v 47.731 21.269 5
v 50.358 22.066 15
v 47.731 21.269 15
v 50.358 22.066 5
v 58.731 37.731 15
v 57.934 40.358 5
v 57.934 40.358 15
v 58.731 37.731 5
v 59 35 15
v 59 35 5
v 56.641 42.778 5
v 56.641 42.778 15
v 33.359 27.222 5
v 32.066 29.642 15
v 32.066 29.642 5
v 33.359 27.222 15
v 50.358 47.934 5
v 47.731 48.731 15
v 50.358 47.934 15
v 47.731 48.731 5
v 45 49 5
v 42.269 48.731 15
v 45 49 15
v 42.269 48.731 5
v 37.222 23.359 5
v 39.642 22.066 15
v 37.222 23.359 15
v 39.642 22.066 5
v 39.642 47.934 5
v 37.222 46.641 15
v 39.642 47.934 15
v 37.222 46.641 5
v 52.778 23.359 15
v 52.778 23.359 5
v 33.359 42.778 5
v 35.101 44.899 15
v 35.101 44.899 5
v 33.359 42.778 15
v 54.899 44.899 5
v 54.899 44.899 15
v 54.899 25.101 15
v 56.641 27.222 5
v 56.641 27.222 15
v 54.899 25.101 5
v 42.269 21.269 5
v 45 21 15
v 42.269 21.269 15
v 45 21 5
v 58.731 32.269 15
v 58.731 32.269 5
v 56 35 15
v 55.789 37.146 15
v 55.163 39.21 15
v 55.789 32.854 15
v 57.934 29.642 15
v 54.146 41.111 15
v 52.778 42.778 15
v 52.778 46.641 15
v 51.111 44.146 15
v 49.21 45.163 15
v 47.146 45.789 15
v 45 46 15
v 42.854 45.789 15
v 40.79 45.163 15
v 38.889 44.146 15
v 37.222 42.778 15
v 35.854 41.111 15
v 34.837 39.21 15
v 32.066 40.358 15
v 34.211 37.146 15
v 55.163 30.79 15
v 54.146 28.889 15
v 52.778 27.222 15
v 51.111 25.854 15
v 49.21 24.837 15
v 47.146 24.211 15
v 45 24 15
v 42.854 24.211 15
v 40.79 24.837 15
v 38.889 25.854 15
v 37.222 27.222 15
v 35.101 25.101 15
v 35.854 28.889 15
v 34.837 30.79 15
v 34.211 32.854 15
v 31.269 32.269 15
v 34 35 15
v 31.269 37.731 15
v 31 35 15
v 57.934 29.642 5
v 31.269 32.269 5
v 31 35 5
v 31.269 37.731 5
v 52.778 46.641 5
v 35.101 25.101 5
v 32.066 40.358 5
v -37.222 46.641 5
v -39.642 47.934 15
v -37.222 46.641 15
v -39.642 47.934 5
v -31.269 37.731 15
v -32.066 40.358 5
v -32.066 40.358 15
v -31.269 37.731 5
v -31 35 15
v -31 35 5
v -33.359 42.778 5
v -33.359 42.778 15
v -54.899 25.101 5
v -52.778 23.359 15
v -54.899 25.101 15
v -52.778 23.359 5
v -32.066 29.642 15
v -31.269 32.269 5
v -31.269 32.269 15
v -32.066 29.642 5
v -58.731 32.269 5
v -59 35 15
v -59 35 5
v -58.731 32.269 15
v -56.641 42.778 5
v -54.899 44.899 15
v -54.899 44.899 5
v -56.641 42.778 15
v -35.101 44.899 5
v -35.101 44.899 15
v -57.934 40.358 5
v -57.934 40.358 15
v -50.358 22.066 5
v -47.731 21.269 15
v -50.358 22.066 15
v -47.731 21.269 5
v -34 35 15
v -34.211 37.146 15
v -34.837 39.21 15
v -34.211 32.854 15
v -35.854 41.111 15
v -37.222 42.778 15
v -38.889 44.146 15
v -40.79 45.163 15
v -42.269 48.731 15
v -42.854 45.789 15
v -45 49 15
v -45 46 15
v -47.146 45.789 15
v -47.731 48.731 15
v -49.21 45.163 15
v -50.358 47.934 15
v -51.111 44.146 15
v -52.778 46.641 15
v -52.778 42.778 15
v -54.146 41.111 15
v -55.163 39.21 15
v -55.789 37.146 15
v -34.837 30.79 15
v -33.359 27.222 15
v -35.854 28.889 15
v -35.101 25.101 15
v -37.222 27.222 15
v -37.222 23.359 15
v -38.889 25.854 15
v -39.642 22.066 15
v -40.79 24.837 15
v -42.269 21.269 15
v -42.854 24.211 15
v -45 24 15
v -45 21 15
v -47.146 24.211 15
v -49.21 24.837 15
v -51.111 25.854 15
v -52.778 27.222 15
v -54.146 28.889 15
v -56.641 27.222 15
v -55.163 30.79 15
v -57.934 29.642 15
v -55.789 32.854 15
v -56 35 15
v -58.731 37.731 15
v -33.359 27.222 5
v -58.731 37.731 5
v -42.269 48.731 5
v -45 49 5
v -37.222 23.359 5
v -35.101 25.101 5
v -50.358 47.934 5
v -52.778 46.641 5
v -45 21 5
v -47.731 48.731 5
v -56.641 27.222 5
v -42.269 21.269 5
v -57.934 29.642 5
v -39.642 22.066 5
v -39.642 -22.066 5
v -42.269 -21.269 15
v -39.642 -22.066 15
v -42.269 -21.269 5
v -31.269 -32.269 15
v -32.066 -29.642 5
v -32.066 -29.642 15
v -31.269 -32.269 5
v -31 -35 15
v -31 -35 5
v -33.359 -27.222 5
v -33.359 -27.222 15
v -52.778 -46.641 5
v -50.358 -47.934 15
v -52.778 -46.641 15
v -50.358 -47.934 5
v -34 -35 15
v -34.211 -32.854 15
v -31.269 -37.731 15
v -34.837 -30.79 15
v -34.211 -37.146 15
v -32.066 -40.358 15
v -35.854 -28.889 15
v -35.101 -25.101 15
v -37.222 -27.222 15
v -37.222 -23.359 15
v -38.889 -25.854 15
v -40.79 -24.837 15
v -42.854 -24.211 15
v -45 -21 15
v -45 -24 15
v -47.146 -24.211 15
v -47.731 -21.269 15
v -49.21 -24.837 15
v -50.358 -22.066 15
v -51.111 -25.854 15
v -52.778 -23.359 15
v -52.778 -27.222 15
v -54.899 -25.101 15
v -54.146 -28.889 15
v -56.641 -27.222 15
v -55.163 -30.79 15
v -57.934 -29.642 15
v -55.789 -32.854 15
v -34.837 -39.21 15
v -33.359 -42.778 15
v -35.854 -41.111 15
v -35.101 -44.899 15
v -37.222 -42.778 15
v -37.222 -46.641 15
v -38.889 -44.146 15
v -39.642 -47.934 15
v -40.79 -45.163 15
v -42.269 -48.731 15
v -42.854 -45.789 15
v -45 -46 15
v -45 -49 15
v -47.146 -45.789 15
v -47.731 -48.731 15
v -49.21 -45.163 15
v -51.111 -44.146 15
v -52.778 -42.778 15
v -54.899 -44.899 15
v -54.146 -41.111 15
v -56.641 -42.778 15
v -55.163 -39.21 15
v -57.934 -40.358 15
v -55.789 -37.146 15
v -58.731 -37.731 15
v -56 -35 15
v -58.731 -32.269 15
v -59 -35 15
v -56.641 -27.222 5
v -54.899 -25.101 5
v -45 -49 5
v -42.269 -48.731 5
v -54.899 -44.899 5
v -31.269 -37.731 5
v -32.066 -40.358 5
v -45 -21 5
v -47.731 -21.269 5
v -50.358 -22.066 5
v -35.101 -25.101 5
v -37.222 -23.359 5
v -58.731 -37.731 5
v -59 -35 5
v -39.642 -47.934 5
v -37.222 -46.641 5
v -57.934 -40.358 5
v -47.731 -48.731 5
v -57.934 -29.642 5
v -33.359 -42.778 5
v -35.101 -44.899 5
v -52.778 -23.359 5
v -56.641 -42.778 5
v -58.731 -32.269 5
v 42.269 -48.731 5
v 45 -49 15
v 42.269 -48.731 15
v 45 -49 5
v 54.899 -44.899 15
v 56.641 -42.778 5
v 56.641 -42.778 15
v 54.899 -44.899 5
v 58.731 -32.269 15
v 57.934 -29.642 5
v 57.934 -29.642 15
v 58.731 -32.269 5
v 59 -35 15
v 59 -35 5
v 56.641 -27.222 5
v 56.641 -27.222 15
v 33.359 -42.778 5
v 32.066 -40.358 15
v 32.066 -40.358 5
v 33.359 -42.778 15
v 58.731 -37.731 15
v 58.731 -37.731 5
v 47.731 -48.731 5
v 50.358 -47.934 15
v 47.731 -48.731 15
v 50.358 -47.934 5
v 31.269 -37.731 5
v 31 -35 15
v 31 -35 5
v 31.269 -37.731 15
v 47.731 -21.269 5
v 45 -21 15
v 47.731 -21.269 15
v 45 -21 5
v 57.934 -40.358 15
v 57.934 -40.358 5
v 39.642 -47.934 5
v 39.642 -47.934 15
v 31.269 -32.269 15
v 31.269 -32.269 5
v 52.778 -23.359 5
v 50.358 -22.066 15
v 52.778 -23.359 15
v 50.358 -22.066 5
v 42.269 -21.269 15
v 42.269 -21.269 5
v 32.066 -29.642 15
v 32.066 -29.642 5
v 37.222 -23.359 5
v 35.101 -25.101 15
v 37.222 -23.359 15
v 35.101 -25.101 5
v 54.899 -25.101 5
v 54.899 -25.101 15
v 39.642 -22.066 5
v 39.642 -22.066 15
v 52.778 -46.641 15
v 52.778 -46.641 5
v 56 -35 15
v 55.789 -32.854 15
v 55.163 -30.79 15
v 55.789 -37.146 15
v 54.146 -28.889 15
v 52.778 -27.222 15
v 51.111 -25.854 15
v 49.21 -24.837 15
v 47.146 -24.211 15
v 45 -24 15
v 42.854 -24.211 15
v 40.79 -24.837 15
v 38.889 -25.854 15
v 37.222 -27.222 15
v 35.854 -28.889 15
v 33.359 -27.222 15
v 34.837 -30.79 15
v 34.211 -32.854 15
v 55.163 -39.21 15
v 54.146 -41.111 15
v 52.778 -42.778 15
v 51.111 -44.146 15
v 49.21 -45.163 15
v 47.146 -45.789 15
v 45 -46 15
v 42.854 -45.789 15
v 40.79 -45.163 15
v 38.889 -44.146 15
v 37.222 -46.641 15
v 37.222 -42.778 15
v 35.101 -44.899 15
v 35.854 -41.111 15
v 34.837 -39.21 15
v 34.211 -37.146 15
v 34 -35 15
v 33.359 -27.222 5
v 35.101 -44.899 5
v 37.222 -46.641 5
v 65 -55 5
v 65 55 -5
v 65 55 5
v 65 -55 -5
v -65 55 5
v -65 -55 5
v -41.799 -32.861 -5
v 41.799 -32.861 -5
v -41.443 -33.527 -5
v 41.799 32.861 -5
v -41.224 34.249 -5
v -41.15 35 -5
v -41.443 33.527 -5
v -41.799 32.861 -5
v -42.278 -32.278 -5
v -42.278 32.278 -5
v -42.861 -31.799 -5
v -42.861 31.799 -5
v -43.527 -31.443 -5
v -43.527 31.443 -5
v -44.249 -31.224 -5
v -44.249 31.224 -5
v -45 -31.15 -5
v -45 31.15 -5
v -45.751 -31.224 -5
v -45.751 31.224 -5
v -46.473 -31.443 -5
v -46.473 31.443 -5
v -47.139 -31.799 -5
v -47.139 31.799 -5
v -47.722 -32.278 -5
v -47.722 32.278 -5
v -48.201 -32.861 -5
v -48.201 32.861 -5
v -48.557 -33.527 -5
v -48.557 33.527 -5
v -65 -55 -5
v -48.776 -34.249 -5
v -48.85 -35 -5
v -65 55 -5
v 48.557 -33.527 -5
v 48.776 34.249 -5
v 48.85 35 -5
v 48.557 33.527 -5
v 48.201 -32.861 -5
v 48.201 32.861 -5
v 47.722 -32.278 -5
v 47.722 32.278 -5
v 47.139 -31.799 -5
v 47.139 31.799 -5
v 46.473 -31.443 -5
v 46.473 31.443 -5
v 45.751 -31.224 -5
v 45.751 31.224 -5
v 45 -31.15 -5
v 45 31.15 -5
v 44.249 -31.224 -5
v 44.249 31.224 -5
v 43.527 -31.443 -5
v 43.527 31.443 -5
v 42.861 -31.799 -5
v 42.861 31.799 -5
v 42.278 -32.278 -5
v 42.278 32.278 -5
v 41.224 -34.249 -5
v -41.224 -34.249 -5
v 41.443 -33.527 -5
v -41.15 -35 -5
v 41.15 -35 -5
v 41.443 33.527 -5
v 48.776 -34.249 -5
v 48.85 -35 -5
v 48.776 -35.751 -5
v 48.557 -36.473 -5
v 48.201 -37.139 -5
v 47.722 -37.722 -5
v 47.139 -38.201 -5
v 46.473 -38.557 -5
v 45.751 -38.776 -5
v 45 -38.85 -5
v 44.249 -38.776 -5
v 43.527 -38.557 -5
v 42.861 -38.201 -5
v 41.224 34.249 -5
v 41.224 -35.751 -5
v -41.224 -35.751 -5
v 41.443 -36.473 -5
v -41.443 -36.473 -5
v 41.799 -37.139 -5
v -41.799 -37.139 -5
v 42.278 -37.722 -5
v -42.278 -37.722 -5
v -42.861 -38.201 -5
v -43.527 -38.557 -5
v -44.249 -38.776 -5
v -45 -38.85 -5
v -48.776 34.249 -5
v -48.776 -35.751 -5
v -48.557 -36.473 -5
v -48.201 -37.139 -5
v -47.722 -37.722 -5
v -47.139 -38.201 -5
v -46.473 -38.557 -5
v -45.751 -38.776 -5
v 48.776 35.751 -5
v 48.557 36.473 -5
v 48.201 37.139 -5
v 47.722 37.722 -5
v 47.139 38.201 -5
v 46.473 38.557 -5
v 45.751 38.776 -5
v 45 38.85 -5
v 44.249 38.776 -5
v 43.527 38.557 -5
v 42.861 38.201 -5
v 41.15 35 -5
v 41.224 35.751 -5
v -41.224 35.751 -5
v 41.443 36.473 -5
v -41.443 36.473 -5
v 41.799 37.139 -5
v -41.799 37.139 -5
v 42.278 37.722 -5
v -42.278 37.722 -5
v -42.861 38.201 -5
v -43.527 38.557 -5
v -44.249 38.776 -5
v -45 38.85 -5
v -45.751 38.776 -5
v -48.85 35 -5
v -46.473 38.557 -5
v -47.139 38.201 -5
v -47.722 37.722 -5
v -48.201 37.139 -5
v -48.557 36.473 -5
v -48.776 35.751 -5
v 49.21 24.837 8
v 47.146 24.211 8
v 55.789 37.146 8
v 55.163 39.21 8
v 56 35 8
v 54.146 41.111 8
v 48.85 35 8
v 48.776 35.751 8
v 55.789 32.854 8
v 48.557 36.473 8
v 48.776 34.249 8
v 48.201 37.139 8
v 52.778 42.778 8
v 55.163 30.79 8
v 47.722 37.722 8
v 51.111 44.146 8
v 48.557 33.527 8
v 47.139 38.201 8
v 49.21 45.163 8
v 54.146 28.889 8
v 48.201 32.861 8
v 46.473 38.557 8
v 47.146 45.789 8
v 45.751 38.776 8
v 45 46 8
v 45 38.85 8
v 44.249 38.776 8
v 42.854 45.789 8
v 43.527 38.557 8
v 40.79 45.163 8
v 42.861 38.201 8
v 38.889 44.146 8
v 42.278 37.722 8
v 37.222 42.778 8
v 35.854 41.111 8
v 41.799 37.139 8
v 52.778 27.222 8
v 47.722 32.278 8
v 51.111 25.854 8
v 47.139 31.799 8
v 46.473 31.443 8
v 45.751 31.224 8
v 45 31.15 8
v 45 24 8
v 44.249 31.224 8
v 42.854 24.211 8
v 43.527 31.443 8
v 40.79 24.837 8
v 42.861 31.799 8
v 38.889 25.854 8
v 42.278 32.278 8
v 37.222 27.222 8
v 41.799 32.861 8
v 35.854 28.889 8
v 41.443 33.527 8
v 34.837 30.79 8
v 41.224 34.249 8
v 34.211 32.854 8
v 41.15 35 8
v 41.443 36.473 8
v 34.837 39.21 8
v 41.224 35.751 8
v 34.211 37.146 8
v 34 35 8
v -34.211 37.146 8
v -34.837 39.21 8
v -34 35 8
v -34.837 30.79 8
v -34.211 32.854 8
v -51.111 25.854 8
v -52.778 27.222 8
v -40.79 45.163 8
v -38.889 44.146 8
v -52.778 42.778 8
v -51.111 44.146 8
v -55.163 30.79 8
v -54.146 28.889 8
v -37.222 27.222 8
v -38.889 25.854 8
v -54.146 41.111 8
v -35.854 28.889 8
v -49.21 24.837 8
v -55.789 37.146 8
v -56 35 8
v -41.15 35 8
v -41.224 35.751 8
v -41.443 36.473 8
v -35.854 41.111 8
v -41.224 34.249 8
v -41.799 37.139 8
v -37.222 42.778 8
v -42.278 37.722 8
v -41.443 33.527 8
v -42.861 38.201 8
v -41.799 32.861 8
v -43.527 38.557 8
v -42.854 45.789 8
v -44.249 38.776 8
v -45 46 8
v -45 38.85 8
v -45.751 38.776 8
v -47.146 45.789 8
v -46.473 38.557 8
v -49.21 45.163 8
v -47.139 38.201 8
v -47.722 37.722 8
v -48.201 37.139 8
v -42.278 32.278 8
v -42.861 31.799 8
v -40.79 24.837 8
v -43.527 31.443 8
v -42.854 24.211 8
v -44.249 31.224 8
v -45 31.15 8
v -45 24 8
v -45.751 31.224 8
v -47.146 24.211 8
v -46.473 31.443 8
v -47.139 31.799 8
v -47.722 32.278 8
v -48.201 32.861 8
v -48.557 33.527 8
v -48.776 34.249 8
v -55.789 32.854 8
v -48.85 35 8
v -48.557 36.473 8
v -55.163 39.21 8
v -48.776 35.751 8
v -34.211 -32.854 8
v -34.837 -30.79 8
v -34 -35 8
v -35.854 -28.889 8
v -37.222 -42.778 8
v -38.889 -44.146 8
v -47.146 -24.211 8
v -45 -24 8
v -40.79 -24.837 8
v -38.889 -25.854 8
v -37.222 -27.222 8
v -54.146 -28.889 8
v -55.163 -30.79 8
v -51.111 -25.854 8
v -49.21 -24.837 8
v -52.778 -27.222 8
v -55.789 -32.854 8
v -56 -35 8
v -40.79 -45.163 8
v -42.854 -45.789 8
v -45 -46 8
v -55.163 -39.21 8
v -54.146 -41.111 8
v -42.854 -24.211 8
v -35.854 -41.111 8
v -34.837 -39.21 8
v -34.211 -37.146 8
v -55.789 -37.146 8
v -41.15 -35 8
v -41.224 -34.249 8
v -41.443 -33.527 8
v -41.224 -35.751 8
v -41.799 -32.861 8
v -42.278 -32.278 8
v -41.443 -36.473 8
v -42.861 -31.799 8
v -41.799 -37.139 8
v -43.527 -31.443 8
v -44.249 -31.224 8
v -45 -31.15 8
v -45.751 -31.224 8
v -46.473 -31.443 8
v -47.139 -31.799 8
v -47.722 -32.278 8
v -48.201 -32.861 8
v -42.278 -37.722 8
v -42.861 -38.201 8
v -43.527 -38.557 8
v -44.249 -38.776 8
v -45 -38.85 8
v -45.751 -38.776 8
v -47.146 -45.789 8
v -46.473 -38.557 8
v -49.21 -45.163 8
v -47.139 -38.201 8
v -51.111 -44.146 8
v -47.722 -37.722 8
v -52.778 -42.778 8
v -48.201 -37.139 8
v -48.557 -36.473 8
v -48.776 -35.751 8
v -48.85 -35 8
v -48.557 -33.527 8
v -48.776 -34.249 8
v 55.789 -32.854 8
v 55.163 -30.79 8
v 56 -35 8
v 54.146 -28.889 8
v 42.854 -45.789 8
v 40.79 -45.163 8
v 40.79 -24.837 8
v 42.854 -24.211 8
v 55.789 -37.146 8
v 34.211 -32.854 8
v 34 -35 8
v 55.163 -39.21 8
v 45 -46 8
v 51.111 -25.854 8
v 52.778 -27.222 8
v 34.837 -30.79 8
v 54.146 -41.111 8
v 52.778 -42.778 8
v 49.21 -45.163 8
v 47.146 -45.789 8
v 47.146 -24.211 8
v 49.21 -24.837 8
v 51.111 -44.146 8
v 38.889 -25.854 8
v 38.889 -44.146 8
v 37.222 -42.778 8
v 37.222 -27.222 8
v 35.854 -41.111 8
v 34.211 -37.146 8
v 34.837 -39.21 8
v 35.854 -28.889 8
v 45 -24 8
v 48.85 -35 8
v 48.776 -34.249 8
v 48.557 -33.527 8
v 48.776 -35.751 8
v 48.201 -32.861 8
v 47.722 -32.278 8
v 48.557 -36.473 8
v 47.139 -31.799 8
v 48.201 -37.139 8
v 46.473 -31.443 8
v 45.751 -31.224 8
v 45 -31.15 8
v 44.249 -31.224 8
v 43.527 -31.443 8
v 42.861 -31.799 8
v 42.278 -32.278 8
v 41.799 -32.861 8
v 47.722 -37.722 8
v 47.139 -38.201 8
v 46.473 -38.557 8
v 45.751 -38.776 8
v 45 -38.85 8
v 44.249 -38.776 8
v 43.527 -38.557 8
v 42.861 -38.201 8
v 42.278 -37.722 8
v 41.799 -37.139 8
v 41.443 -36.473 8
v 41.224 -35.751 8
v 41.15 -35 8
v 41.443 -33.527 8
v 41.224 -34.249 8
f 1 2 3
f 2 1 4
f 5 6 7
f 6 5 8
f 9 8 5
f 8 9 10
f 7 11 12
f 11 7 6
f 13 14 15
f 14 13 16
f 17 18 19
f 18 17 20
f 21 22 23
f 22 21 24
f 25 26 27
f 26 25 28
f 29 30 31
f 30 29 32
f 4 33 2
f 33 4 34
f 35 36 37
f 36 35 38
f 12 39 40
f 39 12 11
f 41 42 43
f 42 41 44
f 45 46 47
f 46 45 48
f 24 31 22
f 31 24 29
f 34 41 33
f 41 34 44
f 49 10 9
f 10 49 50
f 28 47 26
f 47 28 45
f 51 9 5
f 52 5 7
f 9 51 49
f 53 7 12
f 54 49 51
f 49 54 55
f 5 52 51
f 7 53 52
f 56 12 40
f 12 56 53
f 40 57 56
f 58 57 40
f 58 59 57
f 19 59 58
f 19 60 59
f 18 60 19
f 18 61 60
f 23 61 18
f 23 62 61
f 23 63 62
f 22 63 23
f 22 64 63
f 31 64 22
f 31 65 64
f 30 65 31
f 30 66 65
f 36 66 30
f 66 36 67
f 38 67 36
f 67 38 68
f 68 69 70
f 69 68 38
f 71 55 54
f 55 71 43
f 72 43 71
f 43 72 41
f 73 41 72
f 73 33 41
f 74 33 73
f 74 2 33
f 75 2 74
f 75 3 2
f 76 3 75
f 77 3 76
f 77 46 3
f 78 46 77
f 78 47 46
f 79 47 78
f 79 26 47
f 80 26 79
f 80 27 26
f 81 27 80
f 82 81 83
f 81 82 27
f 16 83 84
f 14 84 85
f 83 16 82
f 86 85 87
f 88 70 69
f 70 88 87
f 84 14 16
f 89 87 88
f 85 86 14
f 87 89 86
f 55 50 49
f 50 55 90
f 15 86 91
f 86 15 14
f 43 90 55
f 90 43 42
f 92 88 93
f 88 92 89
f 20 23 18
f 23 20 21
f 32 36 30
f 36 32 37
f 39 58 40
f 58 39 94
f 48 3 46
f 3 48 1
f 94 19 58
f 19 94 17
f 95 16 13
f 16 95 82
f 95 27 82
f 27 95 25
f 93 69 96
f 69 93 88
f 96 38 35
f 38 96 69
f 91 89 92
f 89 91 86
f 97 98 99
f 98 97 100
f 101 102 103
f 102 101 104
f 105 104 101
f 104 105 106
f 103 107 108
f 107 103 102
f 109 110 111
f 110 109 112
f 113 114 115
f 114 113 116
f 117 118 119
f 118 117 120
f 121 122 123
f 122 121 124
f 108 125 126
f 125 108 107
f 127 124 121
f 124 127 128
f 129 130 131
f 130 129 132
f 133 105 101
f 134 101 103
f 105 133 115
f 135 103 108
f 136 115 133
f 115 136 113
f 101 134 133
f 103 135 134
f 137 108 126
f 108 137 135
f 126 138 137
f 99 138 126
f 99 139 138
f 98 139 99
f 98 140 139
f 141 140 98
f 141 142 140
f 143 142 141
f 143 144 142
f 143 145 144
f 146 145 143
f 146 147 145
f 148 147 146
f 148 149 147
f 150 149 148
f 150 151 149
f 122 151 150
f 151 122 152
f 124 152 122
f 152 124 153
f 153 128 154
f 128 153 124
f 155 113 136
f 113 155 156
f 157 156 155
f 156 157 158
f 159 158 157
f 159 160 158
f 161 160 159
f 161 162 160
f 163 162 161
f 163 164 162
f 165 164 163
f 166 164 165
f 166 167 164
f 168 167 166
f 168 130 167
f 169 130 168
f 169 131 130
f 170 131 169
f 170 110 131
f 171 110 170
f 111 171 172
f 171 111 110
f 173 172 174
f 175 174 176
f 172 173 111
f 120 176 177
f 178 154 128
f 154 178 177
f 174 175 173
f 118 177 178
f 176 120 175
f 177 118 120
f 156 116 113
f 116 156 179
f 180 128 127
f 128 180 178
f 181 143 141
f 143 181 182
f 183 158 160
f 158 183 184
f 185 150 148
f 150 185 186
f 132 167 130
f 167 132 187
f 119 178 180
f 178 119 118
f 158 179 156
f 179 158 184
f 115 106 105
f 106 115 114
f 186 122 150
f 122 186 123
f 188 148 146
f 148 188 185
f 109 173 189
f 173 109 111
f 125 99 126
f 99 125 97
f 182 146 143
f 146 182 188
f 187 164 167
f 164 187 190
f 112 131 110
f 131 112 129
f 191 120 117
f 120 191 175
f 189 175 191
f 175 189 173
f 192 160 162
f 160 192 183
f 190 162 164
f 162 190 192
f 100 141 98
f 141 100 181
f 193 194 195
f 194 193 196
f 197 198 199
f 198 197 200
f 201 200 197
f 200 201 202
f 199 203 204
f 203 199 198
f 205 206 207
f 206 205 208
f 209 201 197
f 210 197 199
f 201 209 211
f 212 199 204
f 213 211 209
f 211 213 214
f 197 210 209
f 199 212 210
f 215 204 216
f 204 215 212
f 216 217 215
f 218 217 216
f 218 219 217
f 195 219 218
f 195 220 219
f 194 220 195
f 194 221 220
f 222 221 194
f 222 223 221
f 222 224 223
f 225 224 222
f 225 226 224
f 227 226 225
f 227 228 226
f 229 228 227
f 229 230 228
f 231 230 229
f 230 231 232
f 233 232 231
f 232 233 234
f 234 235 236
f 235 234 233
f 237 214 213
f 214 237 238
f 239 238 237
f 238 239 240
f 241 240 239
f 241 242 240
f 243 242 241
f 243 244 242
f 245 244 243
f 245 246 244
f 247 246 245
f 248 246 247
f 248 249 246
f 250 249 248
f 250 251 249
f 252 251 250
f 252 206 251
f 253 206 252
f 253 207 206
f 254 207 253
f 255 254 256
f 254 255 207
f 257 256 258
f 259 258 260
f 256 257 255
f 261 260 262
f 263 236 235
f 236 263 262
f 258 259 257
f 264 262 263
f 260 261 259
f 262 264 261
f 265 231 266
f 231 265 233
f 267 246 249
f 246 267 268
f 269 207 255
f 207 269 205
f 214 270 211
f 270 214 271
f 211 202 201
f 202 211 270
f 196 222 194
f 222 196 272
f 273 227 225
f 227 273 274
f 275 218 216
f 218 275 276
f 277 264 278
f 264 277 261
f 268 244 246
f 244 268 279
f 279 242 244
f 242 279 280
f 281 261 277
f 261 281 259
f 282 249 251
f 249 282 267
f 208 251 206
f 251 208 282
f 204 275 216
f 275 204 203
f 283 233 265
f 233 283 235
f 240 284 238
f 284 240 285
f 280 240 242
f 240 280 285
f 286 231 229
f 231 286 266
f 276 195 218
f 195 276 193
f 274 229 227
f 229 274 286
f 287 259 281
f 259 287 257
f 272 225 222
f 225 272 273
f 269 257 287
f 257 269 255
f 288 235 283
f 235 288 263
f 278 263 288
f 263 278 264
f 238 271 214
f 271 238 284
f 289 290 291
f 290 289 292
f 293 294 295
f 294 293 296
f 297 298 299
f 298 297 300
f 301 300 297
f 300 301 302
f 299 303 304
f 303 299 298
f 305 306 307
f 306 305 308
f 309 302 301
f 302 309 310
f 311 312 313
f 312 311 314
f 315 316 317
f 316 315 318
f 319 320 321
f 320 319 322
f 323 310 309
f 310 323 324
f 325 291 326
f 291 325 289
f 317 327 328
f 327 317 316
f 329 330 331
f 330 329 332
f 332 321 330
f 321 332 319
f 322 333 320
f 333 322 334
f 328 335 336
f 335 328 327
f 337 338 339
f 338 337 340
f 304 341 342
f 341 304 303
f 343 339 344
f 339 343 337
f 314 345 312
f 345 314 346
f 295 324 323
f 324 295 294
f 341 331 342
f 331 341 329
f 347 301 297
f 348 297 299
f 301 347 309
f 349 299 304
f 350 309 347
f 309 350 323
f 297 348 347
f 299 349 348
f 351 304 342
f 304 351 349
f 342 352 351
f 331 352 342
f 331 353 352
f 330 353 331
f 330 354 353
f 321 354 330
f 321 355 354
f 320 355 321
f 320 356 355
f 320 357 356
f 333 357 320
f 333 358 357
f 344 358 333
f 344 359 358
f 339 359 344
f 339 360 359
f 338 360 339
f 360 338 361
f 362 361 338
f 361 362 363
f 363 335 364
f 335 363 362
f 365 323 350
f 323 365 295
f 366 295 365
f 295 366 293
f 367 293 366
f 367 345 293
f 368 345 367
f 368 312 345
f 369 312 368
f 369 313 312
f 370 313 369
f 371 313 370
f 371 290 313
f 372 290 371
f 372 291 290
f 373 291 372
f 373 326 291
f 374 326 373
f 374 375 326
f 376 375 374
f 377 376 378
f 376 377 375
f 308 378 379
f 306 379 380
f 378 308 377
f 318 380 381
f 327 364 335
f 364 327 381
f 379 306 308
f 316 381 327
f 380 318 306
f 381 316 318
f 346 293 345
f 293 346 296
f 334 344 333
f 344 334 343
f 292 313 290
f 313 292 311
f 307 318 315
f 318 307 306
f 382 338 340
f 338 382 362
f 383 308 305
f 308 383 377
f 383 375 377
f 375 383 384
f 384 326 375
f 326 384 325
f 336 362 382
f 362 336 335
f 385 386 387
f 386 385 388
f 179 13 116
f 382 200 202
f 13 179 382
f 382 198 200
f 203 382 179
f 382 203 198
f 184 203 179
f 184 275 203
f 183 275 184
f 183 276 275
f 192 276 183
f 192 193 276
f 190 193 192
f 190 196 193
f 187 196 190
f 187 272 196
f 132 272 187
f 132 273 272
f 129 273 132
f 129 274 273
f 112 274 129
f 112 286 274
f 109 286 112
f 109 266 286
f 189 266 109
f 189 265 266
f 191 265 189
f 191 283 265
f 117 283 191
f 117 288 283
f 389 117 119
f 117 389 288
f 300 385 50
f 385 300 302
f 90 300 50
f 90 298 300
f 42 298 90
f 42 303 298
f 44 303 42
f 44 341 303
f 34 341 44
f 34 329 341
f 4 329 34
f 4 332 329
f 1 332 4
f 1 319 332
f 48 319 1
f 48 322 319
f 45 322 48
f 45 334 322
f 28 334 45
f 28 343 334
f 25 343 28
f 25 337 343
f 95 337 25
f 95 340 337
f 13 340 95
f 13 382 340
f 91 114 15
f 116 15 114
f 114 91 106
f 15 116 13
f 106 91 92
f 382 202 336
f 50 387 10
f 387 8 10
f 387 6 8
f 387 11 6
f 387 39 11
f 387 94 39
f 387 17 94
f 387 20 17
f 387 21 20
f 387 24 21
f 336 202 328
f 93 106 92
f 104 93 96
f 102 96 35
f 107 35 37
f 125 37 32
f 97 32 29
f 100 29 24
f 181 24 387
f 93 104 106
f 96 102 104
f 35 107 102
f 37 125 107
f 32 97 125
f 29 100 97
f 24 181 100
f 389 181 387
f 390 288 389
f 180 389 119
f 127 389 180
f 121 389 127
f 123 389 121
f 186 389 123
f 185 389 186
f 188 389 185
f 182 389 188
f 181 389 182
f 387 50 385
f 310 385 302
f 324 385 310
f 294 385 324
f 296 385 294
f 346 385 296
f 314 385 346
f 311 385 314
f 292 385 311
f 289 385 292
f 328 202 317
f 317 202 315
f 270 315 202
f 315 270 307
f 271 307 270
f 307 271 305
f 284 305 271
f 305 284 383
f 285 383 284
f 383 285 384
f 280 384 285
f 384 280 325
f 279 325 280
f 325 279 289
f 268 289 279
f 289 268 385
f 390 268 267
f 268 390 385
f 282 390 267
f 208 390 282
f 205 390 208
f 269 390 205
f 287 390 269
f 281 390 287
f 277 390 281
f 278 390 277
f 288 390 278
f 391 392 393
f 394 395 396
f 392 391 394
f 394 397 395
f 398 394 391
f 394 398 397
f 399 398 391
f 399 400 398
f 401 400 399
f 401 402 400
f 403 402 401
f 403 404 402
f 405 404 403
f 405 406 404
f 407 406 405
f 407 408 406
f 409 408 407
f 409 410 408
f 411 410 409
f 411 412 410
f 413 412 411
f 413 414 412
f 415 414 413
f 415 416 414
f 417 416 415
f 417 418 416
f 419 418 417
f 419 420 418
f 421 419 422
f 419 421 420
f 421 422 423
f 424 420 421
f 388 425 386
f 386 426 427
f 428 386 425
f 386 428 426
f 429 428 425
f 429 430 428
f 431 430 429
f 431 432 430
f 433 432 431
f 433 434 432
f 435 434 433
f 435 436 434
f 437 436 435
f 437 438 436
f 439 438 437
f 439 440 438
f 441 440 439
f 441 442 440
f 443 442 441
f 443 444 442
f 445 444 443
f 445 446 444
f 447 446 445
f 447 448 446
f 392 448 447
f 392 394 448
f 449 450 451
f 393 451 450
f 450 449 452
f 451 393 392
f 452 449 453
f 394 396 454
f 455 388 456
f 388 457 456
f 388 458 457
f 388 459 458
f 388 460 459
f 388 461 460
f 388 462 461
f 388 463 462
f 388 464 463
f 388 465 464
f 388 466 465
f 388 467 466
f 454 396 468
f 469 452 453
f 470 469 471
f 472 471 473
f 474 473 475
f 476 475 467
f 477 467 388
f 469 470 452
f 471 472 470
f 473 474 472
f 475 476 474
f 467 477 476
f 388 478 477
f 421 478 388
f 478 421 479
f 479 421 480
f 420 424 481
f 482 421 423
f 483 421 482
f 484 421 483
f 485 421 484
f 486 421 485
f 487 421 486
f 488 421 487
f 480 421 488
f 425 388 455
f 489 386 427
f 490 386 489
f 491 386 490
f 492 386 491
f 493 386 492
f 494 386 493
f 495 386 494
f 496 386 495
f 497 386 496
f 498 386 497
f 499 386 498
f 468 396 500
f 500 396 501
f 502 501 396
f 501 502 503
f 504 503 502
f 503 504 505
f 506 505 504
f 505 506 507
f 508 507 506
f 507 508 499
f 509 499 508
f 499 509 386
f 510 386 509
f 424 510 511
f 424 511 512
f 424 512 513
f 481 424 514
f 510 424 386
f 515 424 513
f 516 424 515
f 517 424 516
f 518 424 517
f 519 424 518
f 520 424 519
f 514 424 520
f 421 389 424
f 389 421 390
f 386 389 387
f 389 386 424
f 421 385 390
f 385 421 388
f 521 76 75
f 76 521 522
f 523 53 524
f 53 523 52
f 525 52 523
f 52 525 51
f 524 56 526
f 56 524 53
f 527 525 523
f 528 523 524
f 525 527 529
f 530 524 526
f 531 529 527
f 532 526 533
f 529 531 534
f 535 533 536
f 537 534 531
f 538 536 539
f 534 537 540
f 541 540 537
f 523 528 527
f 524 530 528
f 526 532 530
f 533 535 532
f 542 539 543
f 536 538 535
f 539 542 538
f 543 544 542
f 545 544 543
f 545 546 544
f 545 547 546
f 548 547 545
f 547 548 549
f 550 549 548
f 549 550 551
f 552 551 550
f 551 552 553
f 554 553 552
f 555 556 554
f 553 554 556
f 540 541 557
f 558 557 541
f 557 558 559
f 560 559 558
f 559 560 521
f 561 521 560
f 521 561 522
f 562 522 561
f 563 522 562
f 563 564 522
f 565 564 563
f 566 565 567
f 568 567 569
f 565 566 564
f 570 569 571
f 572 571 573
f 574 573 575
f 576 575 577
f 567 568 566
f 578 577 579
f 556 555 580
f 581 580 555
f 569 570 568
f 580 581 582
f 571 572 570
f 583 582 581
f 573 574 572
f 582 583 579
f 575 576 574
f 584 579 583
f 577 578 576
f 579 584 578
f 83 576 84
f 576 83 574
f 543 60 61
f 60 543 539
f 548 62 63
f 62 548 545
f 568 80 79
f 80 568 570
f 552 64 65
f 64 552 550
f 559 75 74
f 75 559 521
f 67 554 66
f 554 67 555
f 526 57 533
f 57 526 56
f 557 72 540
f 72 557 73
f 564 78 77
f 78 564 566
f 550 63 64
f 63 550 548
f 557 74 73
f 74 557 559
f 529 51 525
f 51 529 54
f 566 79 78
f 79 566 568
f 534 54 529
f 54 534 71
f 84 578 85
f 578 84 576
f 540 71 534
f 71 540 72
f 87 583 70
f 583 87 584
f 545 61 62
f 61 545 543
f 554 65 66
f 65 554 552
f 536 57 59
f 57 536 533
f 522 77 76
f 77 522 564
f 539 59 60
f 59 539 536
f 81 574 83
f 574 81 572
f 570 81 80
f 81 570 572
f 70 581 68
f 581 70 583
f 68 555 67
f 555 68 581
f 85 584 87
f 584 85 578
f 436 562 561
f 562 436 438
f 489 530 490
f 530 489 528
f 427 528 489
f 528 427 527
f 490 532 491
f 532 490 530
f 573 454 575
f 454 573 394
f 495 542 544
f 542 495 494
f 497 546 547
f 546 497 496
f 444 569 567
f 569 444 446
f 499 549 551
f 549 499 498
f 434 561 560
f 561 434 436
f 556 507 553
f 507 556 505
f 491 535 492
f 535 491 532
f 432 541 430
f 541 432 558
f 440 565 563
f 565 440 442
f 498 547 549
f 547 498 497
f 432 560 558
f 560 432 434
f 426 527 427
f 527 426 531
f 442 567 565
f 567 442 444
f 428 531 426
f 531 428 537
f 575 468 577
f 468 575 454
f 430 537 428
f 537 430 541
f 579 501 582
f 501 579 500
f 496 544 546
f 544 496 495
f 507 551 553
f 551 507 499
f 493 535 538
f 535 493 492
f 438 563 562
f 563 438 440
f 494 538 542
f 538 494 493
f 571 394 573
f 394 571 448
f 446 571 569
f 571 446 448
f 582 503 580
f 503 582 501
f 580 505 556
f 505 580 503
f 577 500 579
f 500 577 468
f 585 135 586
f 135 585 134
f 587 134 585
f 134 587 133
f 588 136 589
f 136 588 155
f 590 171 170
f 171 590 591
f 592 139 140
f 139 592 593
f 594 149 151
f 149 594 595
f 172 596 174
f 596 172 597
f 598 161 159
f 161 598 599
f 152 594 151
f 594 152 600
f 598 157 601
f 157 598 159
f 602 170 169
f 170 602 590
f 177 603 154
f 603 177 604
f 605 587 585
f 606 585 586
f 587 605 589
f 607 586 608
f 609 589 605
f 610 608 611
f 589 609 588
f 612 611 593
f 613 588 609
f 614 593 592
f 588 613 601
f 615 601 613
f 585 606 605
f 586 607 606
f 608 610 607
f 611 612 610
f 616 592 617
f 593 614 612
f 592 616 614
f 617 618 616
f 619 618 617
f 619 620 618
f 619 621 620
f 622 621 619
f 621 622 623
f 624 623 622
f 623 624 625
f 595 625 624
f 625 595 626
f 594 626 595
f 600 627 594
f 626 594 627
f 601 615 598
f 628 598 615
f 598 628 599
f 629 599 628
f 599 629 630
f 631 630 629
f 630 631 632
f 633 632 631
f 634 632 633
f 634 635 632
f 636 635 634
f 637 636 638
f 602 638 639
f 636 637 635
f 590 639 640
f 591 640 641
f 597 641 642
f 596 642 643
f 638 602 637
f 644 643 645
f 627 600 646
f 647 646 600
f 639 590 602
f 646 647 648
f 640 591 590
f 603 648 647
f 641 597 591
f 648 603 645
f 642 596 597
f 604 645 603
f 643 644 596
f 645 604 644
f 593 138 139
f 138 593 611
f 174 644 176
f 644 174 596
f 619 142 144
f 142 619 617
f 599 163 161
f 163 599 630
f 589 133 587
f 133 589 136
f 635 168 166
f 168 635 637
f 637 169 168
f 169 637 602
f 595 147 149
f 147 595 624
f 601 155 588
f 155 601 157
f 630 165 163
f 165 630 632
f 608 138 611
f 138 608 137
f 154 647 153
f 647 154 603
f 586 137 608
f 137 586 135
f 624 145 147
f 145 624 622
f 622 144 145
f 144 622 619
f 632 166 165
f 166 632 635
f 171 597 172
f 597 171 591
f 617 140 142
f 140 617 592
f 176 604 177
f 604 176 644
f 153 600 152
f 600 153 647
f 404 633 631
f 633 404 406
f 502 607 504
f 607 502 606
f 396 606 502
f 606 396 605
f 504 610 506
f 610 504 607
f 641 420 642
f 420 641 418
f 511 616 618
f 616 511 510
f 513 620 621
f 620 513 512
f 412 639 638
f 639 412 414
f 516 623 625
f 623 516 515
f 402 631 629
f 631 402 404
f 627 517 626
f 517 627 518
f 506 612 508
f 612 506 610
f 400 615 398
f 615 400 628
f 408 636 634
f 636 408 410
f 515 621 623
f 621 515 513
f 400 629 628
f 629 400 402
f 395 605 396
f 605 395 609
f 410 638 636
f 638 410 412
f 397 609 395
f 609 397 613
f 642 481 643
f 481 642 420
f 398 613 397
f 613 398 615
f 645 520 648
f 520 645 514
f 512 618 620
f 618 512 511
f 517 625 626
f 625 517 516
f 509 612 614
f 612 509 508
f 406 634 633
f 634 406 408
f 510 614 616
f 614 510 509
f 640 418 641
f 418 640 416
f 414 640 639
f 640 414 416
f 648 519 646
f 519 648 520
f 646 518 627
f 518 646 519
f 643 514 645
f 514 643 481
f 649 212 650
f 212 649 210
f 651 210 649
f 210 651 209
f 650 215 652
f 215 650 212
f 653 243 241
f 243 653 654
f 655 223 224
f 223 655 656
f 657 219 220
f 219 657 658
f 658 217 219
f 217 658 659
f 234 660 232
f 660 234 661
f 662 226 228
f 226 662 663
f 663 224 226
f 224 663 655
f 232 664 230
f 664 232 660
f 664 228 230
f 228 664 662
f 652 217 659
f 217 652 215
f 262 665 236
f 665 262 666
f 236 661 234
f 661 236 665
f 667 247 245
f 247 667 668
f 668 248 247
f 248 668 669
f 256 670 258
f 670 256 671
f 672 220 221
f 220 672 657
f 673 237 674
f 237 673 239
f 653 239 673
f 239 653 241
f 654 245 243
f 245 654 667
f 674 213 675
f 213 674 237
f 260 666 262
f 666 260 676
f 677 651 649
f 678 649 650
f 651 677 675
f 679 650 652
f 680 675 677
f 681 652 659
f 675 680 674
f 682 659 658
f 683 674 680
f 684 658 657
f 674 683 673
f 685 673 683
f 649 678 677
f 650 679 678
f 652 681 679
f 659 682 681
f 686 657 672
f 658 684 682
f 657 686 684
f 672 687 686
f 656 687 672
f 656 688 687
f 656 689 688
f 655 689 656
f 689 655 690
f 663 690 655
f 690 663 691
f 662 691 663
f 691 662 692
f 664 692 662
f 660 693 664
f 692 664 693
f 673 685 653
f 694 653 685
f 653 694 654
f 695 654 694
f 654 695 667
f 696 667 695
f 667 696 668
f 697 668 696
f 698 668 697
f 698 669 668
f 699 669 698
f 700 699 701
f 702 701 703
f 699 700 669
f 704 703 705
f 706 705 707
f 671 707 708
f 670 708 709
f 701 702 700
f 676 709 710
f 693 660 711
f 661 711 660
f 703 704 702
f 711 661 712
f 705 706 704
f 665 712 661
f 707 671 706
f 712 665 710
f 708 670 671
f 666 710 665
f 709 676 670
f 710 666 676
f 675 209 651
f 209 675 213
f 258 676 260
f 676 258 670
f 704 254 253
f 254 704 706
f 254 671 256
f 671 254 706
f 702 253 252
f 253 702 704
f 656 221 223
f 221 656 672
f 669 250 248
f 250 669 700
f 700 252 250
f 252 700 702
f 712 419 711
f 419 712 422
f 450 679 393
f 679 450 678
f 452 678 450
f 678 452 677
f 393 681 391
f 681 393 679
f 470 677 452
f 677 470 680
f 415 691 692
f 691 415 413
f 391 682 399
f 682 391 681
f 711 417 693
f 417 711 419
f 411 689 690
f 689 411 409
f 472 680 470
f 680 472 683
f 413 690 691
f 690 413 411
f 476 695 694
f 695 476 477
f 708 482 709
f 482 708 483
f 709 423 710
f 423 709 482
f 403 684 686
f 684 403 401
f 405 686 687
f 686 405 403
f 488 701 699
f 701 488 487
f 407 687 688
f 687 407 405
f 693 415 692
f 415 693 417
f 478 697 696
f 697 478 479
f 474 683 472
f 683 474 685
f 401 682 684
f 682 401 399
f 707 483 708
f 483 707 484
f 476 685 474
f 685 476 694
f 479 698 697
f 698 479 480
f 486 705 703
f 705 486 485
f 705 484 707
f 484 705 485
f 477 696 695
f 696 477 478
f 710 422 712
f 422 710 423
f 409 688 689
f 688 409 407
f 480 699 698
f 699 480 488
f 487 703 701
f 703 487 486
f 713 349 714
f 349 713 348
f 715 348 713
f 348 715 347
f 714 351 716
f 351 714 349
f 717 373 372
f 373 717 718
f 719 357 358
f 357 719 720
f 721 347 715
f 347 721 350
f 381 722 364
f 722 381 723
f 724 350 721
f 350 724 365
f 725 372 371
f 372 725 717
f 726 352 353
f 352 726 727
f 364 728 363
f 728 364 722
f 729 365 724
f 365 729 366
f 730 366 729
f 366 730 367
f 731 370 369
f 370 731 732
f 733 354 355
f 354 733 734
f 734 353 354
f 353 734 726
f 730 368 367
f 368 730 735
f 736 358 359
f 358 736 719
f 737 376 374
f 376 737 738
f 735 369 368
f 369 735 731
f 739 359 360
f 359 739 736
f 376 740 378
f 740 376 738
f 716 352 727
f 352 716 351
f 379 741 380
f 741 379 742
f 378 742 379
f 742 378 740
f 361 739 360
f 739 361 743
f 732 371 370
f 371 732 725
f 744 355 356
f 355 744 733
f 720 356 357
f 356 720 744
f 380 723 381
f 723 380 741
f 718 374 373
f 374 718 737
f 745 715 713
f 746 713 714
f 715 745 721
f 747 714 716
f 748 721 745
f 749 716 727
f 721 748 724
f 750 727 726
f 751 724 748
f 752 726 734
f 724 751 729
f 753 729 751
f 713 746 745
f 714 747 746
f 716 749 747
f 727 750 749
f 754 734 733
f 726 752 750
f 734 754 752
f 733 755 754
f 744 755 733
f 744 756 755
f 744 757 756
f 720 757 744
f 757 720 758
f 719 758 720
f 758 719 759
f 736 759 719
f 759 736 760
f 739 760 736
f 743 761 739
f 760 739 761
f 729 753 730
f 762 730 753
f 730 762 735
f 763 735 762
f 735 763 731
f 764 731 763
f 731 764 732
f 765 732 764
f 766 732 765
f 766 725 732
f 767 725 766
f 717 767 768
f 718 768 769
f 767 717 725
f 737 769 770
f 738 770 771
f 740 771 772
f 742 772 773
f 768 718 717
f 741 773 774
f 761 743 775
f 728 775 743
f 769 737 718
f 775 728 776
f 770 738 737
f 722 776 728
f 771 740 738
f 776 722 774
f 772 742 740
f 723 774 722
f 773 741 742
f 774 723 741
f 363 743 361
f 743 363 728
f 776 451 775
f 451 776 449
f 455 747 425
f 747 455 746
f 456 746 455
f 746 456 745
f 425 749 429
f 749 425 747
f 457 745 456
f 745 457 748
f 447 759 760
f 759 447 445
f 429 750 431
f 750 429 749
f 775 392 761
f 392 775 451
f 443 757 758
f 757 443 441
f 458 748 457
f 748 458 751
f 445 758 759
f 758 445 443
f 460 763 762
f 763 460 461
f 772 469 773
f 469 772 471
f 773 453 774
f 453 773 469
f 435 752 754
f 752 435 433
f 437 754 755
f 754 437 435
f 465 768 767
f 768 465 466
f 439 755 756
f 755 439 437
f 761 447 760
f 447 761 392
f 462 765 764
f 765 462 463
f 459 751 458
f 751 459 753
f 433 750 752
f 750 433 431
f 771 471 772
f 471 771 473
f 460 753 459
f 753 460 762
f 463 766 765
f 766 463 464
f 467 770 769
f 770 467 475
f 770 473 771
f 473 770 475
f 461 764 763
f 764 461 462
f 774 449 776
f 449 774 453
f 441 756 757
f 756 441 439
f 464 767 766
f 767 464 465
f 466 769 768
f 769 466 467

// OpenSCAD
$fn = 32;

// ----------------------------------------------------------------------
// Socket pad plate
// bosses with counterbored sockets for the screws
// ----------------------------------------------------------------------

// --- parameters (mm) ---
base_t = 10;             // base plate thickness
boss_h = 10;             // boss height above the base plate
boss_d = 28;             // boss diameter
socket_d = 22;           // socket diameter
socket_depth = 7;        // socket depth from the boss face
bolt_d = 7.7;            // screw clearance hole through the socket floor
plate = [130, 110, 10];  // overall size (x, y, z)
edge = 20;               // boss centre offset from the plate edge
pads = 4;                // boss count, one per corner

// --- derived feature positions (mm) ---
height = base_t + boss_h;        // = 20   overall height of the part
corner_x = plate[0] / 2 - edge;  // = 45   boss centre X
corner_y = plate[1] / 2 - edge;  // = 35   boss centre Y
feature_centers = [
  [corner_x, corner_y],
  [-corner_x, corner_y],
  [-corner_x, -corner_y],
  [corner_x, -corner_y]
];   // boss centres: sockets, holes and the pads themselves are placed from here

// base plate, bosses on feature_centers, socket + through hole in each
difference() {
  union() {
    cube(plate, center = true);
    for (centre = feature_centers)
      translate([centre[0], centre[1], plate[2] / 2 - 1])
        cylinder(d = boss_d, h = boss_h + 1);
  }
  for (centre = feature_centers) {
    translate([centre[0], centre[1], plate[2] / 2 + boss_h - socket_depth])
      cylinder(d = socket_d, h = socket_depth + 1);
    translate([centre[0], centre[1], -height])
      cylinder(d = bolt_d, h = 2 * height + 2);  // through the socket floor
  }
}
